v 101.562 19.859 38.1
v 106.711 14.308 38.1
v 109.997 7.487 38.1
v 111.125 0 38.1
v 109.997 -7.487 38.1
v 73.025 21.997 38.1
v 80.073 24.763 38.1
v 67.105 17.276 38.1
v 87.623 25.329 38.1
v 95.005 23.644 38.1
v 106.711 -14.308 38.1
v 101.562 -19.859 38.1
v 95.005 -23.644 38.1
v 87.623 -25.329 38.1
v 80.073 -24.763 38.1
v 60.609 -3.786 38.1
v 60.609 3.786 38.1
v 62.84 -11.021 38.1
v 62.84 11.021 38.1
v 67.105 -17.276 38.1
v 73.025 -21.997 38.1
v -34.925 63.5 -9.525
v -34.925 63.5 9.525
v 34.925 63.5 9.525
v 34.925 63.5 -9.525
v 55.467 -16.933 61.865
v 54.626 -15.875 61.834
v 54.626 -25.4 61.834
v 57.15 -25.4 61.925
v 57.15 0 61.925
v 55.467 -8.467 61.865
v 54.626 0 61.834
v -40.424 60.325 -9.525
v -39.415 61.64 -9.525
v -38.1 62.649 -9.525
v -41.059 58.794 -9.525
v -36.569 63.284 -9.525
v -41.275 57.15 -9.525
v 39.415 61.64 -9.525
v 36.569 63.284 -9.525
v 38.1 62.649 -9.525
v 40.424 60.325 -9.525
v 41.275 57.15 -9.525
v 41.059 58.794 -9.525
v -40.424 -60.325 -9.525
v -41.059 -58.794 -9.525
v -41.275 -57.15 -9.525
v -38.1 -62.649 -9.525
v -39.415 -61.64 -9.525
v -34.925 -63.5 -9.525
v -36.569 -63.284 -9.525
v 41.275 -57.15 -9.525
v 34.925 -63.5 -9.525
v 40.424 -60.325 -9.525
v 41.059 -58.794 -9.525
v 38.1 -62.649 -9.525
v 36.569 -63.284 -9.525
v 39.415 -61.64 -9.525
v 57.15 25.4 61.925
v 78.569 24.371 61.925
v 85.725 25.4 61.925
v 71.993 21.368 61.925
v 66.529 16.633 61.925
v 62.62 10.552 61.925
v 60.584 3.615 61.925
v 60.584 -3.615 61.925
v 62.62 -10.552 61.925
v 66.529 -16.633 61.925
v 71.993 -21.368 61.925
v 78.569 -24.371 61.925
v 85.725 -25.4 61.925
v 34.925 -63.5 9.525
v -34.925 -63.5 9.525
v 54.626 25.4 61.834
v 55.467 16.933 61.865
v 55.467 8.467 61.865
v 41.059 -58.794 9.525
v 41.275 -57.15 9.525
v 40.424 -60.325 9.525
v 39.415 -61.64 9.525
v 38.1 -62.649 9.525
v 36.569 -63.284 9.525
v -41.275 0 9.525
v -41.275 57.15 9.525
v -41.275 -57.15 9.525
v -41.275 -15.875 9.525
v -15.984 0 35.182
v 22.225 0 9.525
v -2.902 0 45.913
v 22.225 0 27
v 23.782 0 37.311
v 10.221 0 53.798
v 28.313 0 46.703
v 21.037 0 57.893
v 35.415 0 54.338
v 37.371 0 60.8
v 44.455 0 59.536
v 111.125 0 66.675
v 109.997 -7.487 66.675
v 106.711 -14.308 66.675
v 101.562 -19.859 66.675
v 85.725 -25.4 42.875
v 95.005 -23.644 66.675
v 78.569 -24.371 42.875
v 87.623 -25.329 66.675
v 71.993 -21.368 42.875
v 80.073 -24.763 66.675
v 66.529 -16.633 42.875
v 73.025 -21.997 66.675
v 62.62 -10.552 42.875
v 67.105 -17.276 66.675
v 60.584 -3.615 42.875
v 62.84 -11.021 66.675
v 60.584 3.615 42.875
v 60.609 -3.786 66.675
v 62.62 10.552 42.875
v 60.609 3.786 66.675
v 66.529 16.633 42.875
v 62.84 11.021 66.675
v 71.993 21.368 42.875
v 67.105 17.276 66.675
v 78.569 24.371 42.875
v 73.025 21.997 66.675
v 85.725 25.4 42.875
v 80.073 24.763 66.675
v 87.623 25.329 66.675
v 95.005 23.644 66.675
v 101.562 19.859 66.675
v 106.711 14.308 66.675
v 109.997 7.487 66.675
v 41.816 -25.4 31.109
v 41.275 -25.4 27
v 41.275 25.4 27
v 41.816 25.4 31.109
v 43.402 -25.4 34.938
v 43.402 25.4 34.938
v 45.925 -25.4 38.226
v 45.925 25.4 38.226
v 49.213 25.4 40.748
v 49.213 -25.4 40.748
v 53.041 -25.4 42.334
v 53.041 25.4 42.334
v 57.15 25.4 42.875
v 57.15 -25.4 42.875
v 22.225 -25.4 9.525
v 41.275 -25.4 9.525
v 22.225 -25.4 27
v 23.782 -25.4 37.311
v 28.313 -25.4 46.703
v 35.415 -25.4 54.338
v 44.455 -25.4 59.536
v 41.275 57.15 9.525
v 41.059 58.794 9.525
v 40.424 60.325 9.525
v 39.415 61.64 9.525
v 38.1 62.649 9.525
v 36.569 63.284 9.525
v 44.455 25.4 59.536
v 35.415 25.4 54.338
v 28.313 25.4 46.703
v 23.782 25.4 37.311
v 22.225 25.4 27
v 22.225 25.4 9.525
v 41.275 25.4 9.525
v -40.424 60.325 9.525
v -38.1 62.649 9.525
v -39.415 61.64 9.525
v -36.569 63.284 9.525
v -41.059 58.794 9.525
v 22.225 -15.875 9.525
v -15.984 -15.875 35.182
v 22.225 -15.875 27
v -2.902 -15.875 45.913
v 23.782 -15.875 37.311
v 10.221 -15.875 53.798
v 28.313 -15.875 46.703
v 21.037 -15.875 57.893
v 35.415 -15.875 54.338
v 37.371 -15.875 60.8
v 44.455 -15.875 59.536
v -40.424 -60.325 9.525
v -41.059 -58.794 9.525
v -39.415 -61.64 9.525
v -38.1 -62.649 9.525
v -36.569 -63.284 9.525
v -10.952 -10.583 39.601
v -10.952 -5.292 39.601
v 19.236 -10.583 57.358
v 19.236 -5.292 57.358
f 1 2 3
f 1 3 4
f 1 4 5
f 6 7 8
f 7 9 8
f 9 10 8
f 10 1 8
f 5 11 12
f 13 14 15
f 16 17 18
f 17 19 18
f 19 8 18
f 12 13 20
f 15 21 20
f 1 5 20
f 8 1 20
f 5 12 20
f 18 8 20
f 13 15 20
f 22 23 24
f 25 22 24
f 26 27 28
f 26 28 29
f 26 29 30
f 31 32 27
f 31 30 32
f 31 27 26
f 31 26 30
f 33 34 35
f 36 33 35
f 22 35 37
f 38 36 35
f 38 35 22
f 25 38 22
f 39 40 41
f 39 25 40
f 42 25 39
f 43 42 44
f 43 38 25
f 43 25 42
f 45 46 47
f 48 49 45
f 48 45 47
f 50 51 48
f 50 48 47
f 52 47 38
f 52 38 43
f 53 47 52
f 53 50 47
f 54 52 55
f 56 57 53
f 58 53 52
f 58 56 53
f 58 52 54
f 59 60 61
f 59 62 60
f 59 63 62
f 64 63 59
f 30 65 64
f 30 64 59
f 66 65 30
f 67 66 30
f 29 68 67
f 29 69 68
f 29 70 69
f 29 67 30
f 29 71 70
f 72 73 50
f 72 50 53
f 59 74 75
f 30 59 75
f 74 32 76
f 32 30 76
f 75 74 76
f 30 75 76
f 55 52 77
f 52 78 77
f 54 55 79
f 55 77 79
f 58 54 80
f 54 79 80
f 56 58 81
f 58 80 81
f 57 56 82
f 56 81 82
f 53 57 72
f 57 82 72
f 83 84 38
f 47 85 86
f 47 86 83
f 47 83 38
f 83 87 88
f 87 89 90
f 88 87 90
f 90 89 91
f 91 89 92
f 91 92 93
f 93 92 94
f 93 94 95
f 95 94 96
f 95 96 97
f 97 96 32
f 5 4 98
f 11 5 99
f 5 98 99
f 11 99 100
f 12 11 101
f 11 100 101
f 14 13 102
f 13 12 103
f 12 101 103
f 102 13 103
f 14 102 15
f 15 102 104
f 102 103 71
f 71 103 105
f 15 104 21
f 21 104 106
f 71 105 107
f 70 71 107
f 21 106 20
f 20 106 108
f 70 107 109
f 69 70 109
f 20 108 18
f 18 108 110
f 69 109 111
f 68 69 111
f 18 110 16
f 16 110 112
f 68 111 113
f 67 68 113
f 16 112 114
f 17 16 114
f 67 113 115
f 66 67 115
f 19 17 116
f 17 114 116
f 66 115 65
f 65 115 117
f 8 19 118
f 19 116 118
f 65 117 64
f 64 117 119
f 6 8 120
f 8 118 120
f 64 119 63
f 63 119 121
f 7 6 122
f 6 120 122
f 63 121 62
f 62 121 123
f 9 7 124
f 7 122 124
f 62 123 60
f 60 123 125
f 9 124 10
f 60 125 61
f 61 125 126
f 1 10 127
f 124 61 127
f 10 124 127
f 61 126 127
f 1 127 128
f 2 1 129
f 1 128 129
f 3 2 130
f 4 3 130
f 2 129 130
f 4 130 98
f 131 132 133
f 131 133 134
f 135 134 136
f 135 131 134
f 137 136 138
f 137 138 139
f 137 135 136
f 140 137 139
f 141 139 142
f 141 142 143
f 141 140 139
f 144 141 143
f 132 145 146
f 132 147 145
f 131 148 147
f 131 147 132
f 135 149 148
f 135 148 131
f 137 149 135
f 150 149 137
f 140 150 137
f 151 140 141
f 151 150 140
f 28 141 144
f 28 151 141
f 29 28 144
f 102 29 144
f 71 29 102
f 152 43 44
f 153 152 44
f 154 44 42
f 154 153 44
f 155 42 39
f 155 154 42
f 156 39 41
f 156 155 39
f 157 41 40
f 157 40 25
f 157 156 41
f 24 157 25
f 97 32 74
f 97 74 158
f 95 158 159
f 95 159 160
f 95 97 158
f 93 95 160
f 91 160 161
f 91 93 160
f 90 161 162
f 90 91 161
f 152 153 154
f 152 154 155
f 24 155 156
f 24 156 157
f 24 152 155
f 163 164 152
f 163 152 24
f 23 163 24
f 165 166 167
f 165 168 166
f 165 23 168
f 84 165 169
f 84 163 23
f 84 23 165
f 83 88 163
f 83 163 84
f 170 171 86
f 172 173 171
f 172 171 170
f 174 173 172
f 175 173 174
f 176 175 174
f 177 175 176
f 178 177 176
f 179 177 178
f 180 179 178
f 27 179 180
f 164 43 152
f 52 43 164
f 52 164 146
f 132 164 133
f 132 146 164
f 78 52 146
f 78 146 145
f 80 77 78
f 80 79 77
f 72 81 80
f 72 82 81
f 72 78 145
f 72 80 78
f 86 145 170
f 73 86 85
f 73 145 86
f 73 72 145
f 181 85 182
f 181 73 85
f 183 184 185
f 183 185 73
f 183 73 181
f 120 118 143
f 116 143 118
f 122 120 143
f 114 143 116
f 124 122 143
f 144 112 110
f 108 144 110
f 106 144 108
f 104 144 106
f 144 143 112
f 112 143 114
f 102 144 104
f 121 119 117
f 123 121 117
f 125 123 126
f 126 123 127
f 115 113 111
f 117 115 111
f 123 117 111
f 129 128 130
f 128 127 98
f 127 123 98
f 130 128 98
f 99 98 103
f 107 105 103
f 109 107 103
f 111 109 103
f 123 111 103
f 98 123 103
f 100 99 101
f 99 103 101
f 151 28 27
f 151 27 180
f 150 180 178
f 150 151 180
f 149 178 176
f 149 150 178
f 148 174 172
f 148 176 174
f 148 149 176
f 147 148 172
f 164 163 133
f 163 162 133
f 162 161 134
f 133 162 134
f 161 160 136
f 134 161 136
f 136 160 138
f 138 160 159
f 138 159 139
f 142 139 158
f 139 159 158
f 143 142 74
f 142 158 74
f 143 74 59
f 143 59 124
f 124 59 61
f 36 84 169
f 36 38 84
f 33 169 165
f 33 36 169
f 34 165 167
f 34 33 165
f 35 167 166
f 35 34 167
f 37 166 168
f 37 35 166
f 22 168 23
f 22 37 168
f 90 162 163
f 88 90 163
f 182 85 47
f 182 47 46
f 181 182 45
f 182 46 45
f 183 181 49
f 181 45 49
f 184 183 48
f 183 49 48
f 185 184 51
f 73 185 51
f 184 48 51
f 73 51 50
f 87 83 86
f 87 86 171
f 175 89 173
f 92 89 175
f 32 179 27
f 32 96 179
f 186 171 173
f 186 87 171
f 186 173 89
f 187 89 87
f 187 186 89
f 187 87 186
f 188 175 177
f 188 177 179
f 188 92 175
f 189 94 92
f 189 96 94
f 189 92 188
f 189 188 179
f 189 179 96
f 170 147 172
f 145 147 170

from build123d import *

# Parameters (mm, degrees)
F1_DEPTH = 63.5
F0_W     = 25.4
F0_H     = 19.05
F2_DEPTH = 25.4
F3_DEPTH = 15.875
F5_R     = 6.35


# Not quite as in the source:
# - a feature names something its author has since deleted; it is built from what else it names


with BuildPart() as f1:
    # F0 (on Front) → F1 (new body, symmetric)
    with BuildSketch(Plane.XZ):
        Polygon((41.275, -9.525), (41.275, 9.525), (22.225, 9.525), (-41.275, 9.525), (-41.275, -9.525), align=None)
    extrude(amount=F1_DEPTH, both=True)

    # F0 (on Front) → F2 (join, symmetric)
    with BuildSketch(Plane.XZ):
        with BuildLine():
            Line((22.225, 9.525), (41.275, 9.525))
            Line((41.275, 9.525), (41.275, 27.0002))
            ThreePointArc((41.275, 27.0002), (45.9246798487, 38.2255201513), (57.15, 42.8752))
            Line((57.15, 42.8752), (60.325, 42.8752))
            Line((60.325, 42.8752), (60.325, 61.9252))
            Line((60.325, 61.9252), (57.15, 61.9252))
            add(Edge.make_bspline(
                [(54.6259105013, 61.8338704526), (55.4670032291, 61.8648637063), (56.3085016145, 61.8950318532), (57.15, 61.9252)],
                knots=[0.9787843068, 0.9787843068, 0.9787843068, 0.9787843068, 1, 1, 1, 1], degree=3))
            ThreePointArc((54.6259105013, 61.8338704526), (31.5774614993, 50.7867697323), (22.225, 27.0002))
            Line((22.225, 27.0002), (22.225, 9.525))
        make_face()
        with Locations((73.025, 52.4002)):
            Rectangle(F0_W, F0_H)
    extrude(amount=F2_DEPTH, both=True)

    # F0 (on Front) → F3 (join)
    with BuildSketch(Plane.XZ):
        with BuildLine():
            Line((-41.275, 9.525), (22.225, 9.525))
            Line((22.225, 9.525), (22.225, 27.0002))
            ThreePointArc((22.225, 27.0002), (31.5774614993, 50.7867697323), (54.6259105013, 61.8338704526))
            add(Edge.make_bspline(
                [(-41.275, 9.525), (-31.2937791868, 20.1864348925), (-12.273821172, 40.5025913853), (17.5953077761, 60.105451895), (42.3186244489, 61.380361789), (54.6259105013, 61.8338704526)],
                knots=[0, 0, 0, 0, 0.3507319306, 0.6683457584, 0.9787843068, 0.9787843068, 0.9787843068, 0.9787843068], degree=3))
        make_face()
    extrude(amount=F3_DEPTH)

    # F0 (on Front) → F4 (revolve)
    with BuildSketch(Plane.XZ):
        Polygon((85.725, 61.9252), (85.725, 42.8752), (85.725, 38.1), (111.125, 38.1), (111.125, 66.675), (85.725, 66.675), align=None)
    revolve(axis=Axis((85.725, 0, 52.3875), (0, 0, -1)))

    # F5
    f5_edges = [f1.edges().sort_by_distance(p)[0] for p in [
        (-41.275, -63.5, 0),
        (-41.275, 63.5, 0),
        (41.275, 63.5, 0),
        (41.275, -63.5, 0),
    ]]
    fillet(f5_edges, radius=F5_R)


solid = f1.part
